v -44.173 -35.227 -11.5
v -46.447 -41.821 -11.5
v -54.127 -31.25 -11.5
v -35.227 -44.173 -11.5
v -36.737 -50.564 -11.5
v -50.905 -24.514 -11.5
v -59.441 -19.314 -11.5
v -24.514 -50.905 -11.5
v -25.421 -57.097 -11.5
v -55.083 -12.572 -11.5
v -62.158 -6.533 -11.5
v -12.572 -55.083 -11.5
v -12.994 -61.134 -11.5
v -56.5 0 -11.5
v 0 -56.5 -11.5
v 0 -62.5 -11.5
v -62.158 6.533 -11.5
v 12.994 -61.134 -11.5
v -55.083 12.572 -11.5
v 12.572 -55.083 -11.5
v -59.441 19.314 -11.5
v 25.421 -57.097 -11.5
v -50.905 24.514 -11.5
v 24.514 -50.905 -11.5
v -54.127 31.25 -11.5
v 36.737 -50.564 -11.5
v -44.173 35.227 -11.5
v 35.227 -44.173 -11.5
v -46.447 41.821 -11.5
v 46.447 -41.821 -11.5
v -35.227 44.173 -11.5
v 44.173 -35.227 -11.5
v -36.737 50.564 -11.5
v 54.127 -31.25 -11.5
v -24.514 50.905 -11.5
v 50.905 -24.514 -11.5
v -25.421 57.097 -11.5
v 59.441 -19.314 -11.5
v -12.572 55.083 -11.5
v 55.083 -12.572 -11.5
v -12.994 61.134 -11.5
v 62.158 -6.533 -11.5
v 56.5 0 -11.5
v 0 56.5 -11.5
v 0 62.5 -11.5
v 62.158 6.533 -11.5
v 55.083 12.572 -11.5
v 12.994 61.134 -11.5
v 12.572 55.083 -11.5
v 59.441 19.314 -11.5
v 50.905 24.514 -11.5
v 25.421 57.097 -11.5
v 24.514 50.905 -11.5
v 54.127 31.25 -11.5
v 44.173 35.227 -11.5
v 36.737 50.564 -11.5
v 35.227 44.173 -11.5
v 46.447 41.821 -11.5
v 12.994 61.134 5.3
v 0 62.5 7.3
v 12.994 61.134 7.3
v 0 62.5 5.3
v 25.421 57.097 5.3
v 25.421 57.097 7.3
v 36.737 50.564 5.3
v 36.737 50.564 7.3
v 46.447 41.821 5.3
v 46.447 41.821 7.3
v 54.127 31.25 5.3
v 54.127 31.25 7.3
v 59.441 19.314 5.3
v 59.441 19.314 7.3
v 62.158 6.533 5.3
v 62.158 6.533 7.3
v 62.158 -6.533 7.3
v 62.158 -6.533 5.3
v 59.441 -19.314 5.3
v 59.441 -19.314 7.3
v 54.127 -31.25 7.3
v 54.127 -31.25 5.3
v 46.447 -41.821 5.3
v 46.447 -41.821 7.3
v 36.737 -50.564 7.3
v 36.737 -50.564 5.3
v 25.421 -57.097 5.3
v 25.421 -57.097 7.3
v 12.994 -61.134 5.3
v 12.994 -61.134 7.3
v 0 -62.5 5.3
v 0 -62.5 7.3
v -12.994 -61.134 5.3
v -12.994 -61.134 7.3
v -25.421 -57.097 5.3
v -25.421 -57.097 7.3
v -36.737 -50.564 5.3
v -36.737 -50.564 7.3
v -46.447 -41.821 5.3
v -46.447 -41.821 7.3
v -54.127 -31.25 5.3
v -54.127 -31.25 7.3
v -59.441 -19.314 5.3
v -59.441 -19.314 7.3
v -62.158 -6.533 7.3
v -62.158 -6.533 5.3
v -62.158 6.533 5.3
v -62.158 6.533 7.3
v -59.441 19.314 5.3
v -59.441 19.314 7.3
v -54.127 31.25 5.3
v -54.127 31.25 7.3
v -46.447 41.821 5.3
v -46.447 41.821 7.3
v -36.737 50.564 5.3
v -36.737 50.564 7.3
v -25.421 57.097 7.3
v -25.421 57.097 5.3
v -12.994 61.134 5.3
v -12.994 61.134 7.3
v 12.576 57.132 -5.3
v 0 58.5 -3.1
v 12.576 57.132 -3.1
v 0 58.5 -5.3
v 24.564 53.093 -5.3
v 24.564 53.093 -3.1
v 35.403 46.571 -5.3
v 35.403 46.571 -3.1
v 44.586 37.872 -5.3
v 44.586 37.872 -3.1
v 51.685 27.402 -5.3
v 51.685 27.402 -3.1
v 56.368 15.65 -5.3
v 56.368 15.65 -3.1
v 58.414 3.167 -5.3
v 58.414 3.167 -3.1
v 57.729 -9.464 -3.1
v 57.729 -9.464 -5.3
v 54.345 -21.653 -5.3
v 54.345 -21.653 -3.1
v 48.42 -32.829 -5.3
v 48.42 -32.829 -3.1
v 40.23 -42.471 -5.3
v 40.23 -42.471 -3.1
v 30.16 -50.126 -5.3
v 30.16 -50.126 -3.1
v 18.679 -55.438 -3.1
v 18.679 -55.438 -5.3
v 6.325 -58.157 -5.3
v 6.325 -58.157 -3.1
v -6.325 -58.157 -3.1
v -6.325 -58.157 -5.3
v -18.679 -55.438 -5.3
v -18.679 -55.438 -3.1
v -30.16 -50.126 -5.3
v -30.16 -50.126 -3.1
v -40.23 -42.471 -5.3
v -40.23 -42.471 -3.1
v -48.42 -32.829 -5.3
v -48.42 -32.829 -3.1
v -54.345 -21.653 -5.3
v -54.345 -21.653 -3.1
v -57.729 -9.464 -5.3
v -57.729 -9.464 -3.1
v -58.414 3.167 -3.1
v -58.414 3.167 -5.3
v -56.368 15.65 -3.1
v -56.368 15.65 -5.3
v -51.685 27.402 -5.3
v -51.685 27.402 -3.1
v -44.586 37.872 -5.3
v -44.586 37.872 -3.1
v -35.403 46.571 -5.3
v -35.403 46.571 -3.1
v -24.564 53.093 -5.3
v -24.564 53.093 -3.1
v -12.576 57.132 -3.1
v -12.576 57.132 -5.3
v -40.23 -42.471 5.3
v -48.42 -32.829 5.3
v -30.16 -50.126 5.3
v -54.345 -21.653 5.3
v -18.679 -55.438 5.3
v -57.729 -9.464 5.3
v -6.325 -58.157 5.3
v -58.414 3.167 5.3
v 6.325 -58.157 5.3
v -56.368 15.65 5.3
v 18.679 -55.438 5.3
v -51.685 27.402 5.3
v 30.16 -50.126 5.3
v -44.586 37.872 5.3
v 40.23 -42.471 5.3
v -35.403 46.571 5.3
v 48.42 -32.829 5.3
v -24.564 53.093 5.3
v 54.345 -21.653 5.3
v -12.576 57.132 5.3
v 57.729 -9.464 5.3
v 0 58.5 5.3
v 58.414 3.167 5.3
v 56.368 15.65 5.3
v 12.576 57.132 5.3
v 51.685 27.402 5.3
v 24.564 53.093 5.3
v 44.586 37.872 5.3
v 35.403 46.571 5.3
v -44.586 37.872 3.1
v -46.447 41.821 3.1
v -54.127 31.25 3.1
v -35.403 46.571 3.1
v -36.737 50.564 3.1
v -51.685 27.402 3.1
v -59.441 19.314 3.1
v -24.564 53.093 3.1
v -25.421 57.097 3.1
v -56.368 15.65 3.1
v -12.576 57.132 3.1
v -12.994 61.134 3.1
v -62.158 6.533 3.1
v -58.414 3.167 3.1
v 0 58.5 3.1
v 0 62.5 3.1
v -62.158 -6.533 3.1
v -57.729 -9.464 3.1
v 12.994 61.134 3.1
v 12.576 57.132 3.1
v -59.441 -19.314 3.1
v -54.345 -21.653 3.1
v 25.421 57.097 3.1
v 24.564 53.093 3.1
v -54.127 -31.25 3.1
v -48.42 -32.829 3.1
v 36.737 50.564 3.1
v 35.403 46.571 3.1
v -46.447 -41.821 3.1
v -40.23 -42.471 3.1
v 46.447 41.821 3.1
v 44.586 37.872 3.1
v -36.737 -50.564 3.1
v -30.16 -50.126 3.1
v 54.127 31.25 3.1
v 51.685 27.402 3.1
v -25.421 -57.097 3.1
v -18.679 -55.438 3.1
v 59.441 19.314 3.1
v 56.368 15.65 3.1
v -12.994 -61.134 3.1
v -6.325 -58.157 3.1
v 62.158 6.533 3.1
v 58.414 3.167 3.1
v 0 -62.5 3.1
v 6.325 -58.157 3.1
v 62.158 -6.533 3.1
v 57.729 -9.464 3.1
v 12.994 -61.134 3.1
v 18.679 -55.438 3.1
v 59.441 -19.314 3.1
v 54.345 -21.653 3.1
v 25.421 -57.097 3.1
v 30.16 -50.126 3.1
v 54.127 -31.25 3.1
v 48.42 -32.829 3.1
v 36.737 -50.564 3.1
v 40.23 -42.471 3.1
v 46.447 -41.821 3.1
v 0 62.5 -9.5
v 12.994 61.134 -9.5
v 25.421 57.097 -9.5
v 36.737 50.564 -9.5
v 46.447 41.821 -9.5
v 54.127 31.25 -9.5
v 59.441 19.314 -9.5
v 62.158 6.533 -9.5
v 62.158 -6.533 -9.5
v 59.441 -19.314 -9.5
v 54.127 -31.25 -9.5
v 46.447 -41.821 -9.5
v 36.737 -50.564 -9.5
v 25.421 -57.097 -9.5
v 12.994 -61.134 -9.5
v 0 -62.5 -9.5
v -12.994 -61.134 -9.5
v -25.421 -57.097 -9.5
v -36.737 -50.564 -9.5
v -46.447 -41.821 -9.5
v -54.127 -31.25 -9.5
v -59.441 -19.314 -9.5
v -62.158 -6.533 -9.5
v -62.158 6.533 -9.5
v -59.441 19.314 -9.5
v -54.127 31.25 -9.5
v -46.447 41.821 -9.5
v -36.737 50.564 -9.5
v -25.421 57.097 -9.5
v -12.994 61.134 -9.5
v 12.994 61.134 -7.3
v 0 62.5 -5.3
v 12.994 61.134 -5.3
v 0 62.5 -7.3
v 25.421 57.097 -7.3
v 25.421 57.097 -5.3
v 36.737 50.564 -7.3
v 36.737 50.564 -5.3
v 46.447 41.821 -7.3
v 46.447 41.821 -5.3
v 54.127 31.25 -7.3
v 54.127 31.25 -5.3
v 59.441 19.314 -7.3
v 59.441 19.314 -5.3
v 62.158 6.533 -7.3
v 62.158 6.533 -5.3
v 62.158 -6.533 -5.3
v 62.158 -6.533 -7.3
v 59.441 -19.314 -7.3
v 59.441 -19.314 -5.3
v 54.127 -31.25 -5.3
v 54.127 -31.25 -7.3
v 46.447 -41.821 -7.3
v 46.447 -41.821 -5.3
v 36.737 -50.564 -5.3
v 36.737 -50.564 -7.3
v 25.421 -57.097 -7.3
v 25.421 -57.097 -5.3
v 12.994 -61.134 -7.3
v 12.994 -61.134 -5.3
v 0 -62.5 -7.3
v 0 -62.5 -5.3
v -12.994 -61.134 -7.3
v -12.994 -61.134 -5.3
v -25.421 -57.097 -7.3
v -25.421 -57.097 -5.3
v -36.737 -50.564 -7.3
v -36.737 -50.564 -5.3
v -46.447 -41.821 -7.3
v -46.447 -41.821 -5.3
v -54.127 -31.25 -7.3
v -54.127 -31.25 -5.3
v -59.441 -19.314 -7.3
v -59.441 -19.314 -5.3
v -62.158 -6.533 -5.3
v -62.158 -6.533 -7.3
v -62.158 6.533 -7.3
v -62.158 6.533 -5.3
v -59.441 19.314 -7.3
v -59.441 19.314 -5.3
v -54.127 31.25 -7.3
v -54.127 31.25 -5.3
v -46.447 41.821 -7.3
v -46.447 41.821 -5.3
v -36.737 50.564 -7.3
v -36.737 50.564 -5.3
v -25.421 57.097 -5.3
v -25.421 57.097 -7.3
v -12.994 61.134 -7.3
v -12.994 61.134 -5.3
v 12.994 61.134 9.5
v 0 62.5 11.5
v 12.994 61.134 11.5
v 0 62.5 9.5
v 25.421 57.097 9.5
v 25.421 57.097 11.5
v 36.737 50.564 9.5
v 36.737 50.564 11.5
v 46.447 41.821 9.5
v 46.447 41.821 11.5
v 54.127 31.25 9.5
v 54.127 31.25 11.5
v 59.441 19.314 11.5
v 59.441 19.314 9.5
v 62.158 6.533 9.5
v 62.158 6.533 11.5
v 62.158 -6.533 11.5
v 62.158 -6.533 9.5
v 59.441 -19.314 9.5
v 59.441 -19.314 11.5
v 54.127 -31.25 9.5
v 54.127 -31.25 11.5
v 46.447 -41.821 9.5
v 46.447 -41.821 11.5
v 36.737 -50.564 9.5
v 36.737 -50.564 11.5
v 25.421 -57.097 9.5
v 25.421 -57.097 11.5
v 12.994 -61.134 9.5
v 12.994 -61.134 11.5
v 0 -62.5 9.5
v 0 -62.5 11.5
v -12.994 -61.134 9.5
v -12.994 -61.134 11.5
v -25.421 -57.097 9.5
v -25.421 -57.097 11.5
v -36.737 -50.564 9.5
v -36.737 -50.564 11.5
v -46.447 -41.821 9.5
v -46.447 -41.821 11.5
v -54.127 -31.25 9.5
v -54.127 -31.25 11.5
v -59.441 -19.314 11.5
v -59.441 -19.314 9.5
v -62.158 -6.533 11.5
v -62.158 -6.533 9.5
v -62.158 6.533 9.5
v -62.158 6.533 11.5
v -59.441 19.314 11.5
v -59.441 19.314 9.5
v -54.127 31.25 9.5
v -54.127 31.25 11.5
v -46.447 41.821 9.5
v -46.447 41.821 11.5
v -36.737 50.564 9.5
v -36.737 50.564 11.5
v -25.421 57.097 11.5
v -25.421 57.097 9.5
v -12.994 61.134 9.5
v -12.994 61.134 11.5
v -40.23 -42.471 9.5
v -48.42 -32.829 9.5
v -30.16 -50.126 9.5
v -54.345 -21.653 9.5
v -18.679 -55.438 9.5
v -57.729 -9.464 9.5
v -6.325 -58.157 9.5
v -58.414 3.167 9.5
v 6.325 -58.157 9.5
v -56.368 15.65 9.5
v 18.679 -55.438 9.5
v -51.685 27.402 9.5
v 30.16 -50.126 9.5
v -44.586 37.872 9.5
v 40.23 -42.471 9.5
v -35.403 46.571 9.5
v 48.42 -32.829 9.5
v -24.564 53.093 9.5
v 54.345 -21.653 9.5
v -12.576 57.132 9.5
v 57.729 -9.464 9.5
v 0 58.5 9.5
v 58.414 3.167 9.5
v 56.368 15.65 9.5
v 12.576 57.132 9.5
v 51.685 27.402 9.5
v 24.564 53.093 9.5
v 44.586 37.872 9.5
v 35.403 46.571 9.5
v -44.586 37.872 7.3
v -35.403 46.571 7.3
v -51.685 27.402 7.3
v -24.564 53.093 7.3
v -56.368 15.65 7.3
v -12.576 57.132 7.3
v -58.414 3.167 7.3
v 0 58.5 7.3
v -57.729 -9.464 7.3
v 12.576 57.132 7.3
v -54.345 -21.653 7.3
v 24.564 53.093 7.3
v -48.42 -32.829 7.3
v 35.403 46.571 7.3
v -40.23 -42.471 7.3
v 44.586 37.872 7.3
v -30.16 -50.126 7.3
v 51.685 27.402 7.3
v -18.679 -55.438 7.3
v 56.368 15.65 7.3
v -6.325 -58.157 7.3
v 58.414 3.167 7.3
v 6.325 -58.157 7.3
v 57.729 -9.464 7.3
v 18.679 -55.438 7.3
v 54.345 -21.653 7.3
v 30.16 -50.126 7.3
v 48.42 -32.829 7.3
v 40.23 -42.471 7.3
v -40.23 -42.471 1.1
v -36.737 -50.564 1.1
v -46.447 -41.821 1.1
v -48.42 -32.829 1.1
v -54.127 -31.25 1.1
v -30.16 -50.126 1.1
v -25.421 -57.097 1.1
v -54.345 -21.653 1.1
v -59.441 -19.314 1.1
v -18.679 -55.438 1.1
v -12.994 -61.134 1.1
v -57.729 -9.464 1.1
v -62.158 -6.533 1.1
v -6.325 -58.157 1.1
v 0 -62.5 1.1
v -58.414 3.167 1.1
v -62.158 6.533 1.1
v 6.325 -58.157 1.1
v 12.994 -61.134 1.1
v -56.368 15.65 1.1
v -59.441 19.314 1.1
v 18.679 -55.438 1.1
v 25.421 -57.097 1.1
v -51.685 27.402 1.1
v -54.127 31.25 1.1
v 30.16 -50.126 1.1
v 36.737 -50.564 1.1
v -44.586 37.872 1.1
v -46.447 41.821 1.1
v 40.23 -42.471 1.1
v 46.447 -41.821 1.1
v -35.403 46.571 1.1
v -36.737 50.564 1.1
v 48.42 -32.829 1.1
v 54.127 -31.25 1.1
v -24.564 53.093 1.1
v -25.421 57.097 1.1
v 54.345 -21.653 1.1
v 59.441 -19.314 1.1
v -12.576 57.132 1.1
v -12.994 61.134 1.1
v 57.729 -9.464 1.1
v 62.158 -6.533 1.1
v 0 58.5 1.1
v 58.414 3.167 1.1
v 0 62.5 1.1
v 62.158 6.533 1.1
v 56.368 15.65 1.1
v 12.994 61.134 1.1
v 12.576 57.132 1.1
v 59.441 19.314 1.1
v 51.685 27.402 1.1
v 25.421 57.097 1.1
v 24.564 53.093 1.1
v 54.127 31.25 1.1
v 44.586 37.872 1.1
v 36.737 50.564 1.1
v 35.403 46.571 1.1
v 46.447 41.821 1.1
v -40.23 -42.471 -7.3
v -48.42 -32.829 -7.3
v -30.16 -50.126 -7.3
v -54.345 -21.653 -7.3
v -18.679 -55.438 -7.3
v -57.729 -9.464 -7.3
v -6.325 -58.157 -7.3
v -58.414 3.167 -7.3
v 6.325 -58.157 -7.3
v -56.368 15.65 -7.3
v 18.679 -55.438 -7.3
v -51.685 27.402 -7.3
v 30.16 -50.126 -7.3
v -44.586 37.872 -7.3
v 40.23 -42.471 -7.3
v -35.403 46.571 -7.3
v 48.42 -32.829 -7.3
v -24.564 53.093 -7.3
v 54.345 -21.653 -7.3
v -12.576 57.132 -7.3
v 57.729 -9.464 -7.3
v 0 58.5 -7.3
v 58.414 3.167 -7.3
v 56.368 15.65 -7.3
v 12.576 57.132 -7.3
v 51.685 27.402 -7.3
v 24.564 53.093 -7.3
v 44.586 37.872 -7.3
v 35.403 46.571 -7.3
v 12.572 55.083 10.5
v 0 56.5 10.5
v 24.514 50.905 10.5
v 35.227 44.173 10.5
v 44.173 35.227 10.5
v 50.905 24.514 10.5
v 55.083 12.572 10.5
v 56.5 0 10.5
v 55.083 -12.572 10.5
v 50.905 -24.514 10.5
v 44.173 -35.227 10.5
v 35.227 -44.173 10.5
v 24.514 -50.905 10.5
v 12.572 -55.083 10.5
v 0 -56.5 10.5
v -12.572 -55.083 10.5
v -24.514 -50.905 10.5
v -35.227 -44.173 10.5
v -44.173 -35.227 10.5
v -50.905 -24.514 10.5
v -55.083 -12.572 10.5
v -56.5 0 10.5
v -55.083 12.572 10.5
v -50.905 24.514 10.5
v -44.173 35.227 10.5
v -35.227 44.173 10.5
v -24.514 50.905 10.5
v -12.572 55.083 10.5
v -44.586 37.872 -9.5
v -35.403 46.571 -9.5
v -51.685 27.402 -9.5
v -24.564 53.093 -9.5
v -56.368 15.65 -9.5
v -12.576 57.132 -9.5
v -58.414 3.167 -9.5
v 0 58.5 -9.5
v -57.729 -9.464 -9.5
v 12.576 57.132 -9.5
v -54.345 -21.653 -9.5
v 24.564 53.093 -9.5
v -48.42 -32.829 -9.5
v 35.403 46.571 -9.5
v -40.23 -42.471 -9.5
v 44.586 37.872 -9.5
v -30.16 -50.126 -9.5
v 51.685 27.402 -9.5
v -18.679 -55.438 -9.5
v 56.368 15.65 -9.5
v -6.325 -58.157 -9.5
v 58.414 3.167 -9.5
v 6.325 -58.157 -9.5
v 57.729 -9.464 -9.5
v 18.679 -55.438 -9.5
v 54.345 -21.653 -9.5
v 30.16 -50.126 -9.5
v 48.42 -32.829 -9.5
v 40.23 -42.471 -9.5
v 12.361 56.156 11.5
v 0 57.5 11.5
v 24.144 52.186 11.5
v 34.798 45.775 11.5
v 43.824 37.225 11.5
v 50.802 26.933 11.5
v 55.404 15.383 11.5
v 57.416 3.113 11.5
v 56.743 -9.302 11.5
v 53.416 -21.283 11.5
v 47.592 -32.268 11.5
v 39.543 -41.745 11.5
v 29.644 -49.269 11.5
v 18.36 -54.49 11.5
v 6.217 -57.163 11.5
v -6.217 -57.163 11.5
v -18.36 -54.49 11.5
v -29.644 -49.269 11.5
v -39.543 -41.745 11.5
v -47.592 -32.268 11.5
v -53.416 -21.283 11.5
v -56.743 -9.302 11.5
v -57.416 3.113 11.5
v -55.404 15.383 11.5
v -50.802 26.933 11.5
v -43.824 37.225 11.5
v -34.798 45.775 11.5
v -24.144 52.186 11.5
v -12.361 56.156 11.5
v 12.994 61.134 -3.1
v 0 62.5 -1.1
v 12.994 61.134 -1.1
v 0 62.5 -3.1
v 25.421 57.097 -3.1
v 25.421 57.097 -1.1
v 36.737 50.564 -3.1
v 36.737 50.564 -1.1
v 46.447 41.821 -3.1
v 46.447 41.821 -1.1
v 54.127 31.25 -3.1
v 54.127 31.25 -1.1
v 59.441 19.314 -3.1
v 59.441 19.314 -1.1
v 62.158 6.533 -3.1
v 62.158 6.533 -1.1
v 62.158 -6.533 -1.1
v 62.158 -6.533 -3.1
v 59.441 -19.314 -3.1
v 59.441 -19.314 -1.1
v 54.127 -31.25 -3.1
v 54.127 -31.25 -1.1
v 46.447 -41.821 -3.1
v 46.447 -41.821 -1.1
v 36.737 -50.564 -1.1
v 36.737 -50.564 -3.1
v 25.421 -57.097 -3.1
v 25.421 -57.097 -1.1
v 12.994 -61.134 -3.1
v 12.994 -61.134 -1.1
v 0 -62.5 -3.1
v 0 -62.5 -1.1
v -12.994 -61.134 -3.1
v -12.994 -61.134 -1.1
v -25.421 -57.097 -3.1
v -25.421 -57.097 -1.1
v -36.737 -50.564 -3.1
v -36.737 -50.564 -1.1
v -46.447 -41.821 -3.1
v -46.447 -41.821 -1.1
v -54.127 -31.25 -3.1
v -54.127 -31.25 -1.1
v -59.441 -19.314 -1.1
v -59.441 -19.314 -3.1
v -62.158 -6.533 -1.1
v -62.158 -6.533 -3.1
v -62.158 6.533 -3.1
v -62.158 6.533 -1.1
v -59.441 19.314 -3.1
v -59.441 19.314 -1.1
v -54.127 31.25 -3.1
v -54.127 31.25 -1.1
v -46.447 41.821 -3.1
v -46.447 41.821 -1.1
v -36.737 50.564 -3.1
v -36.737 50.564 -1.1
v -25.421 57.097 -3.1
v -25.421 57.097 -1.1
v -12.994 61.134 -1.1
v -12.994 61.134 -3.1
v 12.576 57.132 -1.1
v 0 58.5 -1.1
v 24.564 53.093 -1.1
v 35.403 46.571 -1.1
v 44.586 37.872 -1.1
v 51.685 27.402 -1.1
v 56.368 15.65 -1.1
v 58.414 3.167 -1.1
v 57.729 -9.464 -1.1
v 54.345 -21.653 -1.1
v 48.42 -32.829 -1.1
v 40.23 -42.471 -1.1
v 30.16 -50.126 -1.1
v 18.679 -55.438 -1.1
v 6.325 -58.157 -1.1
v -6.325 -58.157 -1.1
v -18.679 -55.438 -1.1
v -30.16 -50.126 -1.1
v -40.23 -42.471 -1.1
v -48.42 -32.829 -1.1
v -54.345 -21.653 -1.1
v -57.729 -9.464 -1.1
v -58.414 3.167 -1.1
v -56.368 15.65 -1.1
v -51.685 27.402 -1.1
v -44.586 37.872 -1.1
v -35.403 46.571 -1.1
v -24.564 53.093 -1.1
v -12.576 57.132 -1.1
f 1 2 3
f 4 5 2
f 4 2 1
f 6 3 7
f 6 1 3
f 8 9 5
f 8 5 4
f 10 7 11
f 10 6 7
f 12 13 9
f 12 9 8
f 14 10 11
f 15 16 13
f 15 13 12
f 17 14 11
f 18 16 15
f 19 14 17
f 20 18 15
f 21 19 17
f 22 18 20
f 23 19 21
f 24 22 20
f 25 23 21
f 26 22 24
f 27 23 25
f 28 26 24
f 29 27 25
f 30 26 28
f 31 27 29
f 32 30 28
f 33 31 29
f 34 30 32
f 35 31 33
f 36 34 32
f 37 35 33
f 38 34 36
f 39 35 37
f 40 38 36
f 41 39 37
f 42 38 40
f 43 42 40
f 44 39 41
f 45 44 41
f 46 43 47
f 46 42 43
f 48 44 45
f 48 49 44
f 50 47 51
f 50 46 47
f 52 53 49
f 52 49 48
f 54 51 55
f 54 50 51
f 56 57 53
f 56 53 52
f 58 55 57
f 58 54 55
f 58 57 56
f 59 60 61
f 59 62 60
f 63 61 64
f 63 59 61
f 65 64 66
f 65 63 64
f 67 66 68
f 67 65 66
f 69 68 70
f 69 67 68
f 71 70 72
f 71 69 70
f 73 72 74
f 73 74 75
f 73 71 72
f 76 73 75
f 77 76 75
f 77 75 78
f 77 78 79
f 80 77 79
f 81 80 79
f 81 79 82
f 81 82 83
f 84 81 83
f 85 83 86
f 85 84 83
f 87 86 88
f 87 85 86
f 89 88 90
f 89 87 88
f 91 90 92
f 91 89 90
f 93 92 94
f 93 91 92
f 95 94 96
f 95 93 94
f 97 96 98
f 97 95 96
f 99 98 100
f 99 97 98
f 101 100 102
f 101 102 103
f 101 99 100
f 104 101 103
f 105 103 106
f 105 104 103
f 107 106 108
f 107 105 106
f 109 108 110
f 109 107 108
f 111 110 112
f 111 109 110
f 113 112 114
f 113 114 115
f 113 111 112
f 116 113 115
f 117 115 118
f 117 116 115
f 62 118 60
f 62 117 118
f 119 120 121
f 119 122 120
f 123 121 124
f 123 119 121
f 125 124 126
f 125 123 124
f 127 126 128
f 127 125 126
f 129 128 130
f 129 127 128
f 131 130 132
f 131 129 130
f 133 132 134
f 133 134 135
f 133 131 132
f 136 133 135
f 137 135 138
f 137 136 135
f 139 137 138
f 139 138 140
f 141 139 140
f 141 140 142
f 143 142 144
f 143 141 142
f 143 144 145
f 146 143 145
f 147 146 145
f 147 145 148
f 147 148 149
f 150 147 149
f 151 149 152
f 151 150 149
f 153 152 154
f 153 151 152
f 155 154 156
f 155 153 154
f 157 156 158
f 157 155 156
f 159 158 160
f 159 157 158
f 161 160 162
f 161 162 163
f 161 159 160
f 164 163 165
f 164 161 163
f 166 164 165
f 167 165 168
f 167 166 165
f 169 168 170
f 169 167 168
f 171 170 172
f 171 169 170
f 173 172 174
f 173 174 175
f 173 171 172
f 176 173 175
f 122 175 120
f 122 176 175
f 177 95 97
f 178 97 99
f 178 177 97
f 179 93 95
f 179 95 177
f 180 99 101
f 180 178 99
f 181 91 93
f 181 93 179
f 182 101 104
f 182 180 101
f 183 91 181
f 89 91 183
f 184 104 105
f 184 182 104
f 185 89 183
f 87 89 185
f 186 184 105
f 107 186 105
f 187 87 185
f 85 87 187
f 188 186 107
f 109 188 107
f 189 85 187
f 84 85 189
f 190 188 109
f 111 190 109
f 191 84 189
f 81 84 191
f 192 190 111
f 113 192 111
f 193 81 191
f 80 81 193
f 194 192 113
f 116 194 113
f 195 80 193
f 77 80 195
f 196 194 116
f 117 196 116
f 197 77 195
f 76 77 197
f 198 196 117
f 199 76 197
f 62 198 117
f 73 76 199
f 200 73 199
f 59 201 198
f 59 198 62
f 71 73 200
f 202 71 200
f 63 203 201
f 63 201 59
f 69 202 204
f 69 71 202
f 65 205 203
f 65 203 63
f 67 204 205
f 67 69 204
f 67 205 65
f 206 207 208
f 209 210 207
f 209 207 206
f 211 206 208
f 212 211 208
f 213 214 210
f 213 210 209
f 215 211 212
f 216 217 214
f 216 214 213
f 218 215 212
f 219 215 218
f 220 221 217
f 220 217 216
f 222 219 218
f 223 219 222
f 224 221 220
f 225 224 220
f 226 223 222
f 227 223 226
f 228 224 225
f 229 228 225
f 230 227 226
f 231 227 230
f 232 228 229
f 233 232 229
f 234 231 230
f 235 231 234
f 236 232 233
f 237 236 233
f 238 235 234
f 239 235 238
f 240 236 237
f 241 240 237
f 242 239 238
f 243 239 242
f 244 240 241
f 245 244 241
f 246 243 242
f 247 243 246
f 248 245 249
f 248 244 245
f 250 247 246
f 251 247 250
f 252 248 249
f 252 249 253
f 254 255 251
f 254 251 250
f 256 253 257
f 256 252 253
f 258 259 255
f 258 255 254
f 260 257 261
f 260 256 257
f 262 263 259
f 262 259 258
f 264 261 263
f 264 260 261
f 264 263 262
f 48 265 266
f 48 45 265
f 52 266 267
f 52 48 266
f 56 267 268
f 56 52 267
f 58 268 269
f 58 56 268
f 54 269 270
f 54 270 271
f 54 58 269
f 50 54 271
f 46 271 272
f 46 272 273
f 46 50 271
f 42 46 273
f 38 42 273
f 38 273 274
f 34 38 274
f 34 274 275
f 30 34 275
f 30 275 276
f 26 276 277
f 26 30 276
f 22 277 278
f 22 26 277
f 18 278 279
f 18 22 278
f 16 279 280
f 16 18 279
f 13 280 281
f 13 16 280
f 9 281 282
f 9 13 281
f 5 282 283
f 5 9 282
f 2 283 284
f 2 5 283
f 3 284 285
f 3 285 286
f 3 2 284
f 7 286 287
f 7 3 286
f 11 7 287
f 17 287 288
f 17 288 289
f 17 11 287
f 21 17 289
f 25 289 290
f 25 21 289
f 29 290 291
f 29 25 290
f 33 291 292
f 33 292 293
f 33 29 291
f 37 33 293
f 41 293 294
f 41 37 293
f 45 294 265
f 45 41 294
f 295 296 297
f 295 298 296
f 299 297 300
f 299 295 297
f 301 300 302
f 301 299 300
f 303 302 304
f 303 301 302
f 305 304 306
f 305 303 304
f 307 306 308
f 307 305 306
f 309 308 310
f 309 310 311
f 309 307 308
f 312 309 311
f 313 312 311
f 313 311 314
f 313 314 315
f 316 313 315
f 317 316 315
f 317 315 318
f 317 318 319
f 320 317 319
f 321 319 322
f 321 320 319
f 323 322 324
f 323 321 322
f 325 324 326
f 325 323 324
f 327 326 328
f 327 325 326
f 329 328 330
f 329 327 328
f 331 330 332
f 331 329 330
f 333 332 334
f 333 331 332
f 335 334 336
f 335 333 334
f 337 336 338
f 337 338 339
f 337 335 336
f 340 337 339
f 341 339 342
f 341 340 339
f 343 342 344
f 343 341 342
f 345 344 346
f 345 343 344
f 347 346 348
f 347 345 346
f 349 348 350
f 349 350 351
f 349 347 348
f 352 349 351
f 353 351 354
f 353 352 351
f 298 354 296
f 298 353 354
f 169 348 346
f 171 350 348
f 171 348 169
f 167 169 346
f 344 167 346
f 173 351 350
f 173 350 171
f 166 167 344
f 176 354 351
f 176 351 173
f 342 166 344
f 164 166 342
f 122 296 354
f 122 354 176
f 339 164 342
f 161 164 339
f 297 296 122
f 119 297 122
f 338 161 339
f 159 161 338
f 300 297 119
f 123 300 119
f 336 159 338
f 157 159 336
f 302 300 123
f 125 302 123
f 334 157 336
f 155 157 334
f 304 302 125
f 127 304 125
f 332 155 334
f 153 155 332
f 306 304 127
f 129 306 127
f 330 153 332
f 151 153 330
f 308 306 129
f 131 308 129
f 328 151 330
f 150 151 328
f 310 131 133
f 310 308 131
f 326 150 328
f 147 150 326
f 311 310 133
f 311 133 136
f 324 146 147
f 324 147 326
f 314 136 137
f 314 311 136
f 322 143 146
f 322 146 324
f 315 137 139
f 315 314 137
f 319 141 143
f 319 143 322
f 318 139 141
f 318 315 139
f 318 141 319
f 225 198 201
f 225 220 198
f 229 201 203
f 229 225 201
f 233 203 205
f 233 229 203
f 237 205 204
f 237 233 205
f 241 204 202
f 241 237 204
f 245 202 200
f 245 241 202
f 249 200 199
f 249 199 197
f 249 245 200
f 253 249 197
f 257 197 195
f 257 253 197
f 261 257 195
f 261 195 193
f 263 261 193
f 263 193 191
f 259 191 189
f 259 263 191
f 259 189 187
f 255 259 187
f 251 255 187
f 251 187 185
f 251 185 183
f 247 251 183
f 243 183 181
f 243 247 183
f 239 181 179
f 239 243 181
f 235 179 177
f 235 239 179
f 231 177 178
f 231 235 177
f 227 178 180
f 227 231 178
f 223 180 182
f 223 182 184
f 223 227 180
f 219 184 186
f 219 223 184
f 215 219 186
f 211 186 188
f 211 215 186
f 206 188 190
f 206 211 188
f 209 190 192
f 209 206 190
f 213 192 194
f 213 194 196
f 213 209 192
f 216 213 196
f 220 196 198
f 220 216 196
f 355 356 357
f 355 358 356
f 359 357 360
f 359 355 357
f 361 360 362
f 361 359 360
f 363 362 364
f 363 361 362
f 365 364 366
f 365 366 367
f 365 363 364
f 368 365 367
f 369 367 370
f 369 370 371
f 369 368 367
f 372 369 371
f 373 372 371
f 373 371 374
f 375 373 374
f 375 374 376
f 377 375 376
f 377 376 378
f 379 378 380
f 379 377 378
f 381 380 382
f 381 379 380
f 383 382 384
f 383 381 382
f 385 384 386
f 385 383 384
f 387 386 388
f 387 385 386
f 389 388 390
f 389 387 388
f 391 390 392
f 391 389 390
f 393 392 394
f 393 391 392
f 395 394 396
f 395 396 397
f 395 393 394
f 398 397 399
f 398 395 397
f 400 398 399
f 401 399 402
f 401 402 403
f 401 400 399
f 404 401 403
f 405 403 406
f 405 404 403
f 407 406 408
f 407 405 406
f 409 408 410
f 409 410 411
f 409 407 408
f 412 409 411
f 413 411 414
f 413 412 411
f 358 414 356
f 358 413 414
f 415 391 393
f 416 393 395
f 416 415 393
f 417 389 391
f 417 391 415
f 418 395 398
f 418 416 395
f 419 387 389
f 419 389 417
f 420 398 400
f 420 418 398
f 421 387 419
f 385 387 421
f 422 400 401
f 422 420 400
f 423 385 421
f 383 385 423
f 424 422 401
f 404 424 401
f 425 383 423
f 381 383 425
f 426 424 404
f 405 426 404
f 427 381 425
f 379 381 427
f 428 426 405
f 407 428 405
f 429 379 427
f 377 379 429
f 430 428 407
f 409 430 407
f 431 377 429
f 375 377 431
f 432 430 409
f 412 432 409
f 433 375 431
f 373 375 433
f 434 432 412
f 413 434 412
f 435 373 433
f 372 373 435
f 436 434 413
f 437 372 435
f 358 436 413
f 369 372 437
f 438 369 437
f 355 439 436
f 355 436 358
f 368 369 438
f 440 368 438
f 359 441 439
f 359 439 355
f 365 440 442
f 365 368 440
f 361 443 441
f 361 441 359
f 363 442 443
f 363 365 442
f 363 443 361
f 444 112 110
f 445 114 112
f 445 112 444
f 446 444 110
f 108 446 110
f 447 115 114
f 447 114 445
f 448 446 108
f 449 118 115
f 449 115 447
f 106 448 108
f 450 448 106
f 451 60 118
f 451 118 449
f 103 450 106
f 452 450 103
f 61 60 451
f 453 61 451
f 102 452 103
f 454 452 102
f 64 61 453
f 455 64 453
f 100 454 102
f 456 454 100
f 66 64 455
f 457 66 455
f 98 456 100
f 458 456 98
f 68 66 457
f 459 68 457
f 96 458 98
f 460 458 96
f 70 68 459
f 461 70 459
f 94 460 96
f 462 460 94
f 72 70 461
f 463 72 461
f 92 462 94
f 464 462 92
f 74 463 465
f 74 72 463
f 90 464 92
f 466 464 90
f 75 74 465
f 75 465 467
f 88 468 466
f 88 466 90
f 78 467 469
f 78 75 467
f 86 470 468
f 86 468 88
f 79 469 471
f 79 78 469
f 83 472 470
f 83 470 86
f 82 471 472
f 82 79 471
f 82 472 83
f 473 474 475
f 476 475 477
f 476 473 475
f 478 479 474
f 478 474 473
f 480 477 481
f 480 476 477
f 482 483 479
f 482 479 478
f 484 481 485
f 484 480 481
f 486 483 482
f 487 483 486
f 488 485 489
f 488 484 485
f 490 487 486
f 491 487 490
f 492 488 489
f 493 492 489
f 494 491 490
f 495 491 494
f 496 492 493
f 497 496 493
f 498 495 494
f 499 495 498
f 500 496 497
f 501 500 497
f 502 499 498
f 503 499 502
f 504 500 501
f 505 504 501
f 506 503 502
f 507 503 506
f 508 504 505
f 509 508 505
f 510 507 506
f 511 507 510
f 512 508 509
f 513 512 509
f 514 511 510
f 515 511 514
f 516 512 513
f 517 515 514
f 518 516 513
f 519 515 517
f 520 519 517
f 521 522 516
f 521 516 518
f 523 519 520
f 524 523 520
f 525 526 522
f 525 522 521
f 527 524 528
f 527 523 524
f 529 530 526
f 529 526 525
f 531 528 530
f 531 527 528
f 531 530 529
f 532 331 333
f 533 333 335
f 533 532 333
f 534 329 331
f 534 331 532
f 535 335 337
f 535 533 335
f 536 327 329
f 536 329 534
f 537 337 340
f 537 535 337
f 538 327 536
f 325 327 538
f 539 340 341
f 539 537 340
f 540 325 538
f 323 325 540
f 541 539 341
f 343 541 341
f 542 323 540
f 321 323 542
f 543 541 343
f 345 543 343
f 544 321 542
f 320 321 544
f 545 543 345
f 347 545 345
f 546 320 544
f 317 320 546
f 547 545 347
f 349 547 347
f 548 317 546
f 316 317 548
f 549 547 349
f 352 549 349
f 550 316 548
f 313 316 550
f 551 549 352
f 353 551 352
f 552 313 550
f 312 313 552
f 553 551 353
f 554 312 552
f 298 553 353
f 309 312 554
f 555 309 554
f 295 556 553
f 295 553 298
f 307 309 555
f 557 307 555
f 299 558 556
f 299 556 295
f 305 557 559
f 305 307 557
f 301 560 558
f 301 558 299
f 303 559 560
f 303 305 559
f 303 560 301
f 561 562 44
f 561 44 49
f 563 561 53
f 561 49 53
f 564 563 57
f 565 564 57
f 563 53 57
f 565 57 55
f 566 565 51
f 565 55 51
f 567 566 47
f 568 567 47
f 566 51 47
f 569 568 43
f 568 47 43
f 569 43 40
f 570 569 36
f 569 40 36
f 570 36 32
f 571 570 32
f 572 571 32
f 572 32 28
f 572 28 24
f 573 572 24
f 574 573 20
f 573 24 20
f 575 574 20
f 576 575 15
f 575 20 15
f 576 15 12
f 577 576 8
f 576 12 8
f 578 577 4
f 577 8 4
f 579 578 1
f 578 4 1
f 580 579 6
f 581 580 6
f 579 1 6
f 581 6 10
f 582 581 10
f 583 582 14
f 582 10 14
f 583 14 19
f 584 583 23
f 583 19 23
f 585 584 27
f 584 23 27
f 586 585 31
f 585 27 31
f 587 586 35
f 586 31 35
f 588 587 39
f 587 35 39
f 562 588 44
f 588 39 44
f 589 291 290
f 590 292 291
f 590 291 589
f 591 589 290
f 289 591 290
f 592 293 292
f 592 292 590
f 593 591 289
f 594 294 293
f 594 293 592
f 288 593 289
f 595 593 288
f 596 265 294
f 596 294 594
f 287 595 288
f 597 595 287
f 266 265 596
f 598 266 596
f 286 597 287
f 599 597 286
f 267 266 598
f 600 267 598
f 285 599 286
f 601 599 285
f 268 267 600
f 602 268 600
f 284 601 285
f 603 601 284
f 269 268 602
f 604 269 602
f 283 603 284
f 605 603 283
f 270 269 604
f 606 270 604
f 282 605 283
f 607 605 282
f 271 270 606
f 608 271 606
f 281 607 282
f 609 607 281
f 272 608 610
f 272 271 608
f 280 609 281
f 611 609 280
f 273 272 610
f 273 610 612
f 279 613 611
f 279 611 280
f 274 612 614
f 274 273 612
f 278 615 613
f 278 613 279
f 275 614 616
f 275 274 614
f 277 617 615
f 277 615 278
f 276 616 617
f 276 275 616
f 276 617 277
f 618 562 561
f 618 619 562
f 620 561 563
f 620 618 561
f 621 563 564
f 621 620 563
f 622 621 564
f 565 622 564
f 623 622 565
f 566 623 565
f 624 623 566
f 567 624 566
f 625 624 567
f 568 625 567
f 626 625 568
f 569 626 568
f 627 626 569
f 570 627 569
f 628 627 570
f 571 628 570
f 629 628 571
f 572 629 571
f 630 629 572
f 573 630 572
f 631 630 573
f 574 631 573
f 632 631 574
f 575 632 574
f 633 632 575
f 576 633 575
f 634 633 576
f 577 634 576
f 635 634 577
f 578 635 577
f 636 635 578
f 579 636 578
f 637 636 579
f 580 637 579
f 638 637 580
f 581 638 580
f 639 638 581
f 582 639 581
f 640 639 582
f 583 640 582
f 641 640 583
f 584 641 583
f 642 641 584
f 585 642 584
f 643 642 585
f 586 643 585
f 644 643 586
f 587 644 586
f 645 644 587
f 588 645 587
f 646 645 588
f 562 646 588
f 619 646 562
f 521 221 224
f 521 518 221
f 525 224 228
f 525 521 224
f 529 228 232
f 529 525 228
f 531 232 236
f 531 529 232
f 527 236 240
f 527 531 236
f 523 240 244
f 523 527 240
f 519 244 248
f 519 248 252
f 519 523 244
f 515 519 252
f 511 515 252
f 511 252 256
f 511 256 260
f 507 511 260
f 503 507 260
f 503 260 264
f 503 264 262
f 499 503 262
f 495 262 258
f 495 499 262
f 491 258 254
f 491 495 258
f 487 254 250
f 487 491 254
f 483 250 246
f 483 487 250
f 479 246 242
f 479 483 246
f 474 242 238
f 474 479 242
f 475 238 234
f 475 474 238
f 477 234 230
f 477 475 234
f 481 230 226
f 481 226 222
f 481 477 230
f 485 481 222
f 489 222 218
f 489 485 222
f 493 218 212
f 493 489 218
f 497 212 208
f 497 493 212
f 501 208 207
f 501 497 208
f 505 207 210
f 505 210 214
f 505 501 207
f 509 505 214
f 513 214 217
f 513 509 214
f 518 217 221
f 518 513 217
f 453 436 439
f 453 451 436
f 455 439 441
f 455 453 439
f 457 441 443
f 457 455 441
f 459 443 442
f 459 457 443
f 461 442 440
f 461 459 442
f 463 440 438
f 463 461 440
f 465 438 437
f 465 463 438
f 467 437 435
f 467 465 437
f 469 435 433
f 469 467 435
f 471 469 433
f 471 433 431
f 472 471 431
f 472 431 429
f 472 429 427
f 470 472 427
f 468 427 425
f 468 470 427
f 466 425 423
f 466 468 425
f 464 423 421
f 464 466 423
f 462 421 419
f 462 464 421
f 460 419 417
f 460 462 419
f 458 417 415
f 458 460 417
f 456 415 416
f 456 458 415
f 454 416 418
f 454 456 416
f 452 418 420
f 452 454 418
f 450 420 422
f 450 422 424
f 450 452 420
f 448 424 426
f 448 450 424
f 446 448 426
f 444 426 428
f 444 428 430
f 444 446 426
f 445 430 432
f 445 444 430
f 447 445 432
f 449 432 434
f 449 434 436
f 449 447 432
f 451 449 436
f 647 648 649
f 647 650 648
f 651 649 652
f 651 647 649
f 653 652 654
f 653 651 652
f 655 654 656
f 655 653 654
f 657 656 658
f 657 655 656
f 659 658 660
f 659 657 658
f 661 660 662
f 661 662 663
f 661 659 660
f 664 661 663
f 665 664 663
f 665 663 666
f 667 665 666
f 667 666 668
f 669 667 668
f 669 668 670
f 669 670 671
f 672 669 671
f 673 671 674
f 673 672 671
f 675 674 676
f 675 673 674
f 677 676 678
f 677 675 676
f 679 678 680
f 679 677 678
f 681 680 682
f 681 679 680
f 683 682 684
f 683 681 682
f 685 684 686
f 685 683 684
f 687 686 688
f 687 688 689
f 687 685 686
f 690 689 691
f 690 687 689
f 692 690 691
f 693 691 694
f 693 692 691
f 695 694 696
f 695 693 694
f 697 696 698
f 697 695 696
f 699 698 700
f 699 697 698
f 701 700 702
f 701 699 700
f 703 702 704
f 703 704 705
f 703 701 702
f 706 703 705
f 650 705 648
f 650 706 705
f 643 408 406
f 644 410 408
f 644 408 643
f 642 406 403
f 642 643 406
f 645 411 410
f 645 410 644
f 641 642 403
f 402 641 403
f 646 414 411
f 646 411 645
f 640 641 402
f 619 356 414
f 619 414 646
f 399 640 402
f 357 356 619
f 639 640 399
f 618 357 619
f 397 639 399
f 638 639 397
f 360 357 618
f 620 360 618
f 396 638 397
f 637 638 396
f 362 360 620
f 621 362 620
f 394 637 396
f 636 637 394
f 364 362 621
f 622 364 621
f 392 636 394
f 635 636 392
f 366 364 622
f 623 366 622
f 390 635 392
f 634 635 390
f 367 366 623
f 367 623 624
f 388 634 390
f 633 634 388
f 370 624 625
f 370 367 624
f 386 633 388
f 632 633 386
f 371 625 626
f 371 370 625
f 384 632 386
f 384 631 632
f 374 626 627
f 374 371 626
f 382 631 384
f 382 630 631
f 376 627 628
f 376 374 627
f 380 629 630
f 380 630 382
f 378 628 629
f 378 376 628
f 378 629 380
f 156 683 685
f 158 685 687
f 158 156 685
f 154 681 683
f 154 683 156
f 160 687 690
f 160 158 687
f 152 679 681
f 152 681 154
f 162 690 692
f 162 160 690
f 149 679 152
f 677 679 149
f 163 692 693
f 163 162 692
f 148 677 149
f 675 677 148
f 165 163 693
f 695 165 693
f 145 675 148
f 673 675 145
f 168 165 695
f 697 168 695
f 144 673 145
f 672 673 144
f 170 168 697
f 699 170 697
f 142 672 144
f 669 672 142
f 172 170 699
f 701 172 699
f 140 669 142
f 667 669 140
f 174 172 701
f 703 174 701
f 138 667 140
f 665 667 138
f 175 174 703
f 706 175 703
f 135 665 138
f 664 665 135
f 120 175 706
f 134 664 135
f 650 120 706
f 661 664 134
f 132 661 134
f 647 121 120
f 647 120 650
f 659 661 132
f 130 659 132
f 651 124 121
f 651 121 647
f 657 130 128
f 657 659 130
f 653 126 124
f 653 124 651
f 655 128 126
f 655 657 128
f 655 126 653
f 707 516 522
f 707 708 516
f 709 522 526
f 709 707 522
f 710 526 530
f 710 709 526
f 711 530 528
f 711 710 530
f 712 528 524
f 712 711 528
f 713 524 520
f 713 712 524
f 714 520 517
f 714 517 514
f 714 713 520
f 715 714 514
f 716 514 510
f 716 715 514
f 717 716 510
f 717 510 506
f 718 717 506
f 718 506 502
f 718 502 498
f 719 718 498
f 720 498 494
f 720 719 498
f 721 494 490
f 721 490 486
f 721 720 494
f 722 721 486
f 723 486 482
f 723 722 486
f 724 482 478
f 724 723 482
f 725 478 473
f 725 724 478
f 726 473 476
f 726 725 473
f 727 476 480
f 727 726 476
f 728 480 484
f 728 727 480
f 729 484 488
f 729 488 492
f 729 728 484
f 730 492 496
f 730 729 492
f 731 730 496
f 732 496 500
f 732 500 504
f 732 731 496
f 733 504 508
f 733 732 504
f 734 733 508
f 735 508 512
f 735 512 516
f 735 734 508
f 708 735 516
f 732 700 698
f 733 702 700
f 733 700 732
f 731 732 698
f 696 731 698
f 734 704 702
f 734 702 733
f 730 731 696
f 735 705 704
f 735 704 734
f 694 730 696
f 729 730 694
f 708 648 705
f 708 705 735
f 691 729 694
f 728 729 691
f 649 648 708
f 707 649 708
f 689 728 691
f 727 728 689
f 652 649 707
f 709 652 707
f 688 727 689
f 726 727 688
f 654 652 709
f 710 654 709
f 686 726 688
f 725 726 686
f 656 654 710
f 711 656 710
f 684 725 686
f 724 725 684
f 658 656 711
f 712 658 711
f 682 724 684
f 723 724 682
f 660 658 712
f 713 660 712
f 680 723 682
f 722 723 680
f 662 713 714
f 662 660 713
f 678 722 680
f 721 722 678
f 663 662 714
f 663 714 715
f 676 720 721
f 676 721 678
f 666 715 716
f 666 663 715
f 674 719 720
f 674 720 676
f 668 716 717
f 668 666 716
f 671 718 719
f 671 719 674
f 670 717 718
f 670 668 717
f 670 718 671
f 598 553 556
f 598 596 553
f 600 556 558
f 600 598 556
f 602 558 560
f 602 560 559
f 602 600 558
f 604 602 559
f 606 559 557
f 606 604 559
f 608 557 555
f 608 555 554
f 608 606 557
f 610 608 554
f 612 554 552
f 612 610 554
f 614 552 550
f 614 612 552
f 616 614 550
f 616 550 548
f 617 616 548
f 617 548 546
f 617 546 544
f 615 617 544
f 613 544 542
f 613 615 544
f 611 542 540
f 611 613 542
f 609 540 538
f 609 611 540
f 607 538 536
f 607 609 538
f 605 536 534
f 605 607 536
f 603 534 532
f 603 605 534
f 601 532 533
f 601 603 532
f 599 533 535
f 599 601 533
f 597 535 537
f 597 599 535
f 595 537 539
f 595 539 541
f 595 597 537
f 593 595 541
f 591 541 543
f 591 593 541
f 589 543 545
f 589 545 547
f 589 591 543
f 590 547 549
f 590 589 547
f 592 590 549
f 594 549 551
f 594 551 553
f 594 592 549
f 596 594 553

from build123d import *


with BuildPart() as part:
    # Schizzo2 → Rivoluzione1 (revolve)
    with BuildSketch(Plane(origin=(0, 0, 0), x_dir=(0, 0, -1), z_dir=(1, 0, 0))):
        Polygon((0, 56.5), (-10.5, 56.5), (-11.5, 57.5), (-11.5, 62.5), (-9.5, 62.5), (-9.5, 58.5), (-7.3, 58.5), (-7.3, 62.5), (-5.3, 62.5), (-5.3, 58.5), (-3.1, 58.5), (-3.1, 62.5), (-1.1, 62.5), (-1.1, 58.5), (1.1, 58.5), (1.1, 62.5), (3.1, 62.5), (3.1, 58.5), (5.3, 58.5), (5.3, 62.5), (7.3, 62.5), (7.3, 58.5), (9.5, 58.5), (9.5, 62.5), (11.5, 62.5), (11.5, 56.5), align=None)
    revolve(axis=Axis((0, 0, 0), (0, 0, -1)))


solid = part.part
